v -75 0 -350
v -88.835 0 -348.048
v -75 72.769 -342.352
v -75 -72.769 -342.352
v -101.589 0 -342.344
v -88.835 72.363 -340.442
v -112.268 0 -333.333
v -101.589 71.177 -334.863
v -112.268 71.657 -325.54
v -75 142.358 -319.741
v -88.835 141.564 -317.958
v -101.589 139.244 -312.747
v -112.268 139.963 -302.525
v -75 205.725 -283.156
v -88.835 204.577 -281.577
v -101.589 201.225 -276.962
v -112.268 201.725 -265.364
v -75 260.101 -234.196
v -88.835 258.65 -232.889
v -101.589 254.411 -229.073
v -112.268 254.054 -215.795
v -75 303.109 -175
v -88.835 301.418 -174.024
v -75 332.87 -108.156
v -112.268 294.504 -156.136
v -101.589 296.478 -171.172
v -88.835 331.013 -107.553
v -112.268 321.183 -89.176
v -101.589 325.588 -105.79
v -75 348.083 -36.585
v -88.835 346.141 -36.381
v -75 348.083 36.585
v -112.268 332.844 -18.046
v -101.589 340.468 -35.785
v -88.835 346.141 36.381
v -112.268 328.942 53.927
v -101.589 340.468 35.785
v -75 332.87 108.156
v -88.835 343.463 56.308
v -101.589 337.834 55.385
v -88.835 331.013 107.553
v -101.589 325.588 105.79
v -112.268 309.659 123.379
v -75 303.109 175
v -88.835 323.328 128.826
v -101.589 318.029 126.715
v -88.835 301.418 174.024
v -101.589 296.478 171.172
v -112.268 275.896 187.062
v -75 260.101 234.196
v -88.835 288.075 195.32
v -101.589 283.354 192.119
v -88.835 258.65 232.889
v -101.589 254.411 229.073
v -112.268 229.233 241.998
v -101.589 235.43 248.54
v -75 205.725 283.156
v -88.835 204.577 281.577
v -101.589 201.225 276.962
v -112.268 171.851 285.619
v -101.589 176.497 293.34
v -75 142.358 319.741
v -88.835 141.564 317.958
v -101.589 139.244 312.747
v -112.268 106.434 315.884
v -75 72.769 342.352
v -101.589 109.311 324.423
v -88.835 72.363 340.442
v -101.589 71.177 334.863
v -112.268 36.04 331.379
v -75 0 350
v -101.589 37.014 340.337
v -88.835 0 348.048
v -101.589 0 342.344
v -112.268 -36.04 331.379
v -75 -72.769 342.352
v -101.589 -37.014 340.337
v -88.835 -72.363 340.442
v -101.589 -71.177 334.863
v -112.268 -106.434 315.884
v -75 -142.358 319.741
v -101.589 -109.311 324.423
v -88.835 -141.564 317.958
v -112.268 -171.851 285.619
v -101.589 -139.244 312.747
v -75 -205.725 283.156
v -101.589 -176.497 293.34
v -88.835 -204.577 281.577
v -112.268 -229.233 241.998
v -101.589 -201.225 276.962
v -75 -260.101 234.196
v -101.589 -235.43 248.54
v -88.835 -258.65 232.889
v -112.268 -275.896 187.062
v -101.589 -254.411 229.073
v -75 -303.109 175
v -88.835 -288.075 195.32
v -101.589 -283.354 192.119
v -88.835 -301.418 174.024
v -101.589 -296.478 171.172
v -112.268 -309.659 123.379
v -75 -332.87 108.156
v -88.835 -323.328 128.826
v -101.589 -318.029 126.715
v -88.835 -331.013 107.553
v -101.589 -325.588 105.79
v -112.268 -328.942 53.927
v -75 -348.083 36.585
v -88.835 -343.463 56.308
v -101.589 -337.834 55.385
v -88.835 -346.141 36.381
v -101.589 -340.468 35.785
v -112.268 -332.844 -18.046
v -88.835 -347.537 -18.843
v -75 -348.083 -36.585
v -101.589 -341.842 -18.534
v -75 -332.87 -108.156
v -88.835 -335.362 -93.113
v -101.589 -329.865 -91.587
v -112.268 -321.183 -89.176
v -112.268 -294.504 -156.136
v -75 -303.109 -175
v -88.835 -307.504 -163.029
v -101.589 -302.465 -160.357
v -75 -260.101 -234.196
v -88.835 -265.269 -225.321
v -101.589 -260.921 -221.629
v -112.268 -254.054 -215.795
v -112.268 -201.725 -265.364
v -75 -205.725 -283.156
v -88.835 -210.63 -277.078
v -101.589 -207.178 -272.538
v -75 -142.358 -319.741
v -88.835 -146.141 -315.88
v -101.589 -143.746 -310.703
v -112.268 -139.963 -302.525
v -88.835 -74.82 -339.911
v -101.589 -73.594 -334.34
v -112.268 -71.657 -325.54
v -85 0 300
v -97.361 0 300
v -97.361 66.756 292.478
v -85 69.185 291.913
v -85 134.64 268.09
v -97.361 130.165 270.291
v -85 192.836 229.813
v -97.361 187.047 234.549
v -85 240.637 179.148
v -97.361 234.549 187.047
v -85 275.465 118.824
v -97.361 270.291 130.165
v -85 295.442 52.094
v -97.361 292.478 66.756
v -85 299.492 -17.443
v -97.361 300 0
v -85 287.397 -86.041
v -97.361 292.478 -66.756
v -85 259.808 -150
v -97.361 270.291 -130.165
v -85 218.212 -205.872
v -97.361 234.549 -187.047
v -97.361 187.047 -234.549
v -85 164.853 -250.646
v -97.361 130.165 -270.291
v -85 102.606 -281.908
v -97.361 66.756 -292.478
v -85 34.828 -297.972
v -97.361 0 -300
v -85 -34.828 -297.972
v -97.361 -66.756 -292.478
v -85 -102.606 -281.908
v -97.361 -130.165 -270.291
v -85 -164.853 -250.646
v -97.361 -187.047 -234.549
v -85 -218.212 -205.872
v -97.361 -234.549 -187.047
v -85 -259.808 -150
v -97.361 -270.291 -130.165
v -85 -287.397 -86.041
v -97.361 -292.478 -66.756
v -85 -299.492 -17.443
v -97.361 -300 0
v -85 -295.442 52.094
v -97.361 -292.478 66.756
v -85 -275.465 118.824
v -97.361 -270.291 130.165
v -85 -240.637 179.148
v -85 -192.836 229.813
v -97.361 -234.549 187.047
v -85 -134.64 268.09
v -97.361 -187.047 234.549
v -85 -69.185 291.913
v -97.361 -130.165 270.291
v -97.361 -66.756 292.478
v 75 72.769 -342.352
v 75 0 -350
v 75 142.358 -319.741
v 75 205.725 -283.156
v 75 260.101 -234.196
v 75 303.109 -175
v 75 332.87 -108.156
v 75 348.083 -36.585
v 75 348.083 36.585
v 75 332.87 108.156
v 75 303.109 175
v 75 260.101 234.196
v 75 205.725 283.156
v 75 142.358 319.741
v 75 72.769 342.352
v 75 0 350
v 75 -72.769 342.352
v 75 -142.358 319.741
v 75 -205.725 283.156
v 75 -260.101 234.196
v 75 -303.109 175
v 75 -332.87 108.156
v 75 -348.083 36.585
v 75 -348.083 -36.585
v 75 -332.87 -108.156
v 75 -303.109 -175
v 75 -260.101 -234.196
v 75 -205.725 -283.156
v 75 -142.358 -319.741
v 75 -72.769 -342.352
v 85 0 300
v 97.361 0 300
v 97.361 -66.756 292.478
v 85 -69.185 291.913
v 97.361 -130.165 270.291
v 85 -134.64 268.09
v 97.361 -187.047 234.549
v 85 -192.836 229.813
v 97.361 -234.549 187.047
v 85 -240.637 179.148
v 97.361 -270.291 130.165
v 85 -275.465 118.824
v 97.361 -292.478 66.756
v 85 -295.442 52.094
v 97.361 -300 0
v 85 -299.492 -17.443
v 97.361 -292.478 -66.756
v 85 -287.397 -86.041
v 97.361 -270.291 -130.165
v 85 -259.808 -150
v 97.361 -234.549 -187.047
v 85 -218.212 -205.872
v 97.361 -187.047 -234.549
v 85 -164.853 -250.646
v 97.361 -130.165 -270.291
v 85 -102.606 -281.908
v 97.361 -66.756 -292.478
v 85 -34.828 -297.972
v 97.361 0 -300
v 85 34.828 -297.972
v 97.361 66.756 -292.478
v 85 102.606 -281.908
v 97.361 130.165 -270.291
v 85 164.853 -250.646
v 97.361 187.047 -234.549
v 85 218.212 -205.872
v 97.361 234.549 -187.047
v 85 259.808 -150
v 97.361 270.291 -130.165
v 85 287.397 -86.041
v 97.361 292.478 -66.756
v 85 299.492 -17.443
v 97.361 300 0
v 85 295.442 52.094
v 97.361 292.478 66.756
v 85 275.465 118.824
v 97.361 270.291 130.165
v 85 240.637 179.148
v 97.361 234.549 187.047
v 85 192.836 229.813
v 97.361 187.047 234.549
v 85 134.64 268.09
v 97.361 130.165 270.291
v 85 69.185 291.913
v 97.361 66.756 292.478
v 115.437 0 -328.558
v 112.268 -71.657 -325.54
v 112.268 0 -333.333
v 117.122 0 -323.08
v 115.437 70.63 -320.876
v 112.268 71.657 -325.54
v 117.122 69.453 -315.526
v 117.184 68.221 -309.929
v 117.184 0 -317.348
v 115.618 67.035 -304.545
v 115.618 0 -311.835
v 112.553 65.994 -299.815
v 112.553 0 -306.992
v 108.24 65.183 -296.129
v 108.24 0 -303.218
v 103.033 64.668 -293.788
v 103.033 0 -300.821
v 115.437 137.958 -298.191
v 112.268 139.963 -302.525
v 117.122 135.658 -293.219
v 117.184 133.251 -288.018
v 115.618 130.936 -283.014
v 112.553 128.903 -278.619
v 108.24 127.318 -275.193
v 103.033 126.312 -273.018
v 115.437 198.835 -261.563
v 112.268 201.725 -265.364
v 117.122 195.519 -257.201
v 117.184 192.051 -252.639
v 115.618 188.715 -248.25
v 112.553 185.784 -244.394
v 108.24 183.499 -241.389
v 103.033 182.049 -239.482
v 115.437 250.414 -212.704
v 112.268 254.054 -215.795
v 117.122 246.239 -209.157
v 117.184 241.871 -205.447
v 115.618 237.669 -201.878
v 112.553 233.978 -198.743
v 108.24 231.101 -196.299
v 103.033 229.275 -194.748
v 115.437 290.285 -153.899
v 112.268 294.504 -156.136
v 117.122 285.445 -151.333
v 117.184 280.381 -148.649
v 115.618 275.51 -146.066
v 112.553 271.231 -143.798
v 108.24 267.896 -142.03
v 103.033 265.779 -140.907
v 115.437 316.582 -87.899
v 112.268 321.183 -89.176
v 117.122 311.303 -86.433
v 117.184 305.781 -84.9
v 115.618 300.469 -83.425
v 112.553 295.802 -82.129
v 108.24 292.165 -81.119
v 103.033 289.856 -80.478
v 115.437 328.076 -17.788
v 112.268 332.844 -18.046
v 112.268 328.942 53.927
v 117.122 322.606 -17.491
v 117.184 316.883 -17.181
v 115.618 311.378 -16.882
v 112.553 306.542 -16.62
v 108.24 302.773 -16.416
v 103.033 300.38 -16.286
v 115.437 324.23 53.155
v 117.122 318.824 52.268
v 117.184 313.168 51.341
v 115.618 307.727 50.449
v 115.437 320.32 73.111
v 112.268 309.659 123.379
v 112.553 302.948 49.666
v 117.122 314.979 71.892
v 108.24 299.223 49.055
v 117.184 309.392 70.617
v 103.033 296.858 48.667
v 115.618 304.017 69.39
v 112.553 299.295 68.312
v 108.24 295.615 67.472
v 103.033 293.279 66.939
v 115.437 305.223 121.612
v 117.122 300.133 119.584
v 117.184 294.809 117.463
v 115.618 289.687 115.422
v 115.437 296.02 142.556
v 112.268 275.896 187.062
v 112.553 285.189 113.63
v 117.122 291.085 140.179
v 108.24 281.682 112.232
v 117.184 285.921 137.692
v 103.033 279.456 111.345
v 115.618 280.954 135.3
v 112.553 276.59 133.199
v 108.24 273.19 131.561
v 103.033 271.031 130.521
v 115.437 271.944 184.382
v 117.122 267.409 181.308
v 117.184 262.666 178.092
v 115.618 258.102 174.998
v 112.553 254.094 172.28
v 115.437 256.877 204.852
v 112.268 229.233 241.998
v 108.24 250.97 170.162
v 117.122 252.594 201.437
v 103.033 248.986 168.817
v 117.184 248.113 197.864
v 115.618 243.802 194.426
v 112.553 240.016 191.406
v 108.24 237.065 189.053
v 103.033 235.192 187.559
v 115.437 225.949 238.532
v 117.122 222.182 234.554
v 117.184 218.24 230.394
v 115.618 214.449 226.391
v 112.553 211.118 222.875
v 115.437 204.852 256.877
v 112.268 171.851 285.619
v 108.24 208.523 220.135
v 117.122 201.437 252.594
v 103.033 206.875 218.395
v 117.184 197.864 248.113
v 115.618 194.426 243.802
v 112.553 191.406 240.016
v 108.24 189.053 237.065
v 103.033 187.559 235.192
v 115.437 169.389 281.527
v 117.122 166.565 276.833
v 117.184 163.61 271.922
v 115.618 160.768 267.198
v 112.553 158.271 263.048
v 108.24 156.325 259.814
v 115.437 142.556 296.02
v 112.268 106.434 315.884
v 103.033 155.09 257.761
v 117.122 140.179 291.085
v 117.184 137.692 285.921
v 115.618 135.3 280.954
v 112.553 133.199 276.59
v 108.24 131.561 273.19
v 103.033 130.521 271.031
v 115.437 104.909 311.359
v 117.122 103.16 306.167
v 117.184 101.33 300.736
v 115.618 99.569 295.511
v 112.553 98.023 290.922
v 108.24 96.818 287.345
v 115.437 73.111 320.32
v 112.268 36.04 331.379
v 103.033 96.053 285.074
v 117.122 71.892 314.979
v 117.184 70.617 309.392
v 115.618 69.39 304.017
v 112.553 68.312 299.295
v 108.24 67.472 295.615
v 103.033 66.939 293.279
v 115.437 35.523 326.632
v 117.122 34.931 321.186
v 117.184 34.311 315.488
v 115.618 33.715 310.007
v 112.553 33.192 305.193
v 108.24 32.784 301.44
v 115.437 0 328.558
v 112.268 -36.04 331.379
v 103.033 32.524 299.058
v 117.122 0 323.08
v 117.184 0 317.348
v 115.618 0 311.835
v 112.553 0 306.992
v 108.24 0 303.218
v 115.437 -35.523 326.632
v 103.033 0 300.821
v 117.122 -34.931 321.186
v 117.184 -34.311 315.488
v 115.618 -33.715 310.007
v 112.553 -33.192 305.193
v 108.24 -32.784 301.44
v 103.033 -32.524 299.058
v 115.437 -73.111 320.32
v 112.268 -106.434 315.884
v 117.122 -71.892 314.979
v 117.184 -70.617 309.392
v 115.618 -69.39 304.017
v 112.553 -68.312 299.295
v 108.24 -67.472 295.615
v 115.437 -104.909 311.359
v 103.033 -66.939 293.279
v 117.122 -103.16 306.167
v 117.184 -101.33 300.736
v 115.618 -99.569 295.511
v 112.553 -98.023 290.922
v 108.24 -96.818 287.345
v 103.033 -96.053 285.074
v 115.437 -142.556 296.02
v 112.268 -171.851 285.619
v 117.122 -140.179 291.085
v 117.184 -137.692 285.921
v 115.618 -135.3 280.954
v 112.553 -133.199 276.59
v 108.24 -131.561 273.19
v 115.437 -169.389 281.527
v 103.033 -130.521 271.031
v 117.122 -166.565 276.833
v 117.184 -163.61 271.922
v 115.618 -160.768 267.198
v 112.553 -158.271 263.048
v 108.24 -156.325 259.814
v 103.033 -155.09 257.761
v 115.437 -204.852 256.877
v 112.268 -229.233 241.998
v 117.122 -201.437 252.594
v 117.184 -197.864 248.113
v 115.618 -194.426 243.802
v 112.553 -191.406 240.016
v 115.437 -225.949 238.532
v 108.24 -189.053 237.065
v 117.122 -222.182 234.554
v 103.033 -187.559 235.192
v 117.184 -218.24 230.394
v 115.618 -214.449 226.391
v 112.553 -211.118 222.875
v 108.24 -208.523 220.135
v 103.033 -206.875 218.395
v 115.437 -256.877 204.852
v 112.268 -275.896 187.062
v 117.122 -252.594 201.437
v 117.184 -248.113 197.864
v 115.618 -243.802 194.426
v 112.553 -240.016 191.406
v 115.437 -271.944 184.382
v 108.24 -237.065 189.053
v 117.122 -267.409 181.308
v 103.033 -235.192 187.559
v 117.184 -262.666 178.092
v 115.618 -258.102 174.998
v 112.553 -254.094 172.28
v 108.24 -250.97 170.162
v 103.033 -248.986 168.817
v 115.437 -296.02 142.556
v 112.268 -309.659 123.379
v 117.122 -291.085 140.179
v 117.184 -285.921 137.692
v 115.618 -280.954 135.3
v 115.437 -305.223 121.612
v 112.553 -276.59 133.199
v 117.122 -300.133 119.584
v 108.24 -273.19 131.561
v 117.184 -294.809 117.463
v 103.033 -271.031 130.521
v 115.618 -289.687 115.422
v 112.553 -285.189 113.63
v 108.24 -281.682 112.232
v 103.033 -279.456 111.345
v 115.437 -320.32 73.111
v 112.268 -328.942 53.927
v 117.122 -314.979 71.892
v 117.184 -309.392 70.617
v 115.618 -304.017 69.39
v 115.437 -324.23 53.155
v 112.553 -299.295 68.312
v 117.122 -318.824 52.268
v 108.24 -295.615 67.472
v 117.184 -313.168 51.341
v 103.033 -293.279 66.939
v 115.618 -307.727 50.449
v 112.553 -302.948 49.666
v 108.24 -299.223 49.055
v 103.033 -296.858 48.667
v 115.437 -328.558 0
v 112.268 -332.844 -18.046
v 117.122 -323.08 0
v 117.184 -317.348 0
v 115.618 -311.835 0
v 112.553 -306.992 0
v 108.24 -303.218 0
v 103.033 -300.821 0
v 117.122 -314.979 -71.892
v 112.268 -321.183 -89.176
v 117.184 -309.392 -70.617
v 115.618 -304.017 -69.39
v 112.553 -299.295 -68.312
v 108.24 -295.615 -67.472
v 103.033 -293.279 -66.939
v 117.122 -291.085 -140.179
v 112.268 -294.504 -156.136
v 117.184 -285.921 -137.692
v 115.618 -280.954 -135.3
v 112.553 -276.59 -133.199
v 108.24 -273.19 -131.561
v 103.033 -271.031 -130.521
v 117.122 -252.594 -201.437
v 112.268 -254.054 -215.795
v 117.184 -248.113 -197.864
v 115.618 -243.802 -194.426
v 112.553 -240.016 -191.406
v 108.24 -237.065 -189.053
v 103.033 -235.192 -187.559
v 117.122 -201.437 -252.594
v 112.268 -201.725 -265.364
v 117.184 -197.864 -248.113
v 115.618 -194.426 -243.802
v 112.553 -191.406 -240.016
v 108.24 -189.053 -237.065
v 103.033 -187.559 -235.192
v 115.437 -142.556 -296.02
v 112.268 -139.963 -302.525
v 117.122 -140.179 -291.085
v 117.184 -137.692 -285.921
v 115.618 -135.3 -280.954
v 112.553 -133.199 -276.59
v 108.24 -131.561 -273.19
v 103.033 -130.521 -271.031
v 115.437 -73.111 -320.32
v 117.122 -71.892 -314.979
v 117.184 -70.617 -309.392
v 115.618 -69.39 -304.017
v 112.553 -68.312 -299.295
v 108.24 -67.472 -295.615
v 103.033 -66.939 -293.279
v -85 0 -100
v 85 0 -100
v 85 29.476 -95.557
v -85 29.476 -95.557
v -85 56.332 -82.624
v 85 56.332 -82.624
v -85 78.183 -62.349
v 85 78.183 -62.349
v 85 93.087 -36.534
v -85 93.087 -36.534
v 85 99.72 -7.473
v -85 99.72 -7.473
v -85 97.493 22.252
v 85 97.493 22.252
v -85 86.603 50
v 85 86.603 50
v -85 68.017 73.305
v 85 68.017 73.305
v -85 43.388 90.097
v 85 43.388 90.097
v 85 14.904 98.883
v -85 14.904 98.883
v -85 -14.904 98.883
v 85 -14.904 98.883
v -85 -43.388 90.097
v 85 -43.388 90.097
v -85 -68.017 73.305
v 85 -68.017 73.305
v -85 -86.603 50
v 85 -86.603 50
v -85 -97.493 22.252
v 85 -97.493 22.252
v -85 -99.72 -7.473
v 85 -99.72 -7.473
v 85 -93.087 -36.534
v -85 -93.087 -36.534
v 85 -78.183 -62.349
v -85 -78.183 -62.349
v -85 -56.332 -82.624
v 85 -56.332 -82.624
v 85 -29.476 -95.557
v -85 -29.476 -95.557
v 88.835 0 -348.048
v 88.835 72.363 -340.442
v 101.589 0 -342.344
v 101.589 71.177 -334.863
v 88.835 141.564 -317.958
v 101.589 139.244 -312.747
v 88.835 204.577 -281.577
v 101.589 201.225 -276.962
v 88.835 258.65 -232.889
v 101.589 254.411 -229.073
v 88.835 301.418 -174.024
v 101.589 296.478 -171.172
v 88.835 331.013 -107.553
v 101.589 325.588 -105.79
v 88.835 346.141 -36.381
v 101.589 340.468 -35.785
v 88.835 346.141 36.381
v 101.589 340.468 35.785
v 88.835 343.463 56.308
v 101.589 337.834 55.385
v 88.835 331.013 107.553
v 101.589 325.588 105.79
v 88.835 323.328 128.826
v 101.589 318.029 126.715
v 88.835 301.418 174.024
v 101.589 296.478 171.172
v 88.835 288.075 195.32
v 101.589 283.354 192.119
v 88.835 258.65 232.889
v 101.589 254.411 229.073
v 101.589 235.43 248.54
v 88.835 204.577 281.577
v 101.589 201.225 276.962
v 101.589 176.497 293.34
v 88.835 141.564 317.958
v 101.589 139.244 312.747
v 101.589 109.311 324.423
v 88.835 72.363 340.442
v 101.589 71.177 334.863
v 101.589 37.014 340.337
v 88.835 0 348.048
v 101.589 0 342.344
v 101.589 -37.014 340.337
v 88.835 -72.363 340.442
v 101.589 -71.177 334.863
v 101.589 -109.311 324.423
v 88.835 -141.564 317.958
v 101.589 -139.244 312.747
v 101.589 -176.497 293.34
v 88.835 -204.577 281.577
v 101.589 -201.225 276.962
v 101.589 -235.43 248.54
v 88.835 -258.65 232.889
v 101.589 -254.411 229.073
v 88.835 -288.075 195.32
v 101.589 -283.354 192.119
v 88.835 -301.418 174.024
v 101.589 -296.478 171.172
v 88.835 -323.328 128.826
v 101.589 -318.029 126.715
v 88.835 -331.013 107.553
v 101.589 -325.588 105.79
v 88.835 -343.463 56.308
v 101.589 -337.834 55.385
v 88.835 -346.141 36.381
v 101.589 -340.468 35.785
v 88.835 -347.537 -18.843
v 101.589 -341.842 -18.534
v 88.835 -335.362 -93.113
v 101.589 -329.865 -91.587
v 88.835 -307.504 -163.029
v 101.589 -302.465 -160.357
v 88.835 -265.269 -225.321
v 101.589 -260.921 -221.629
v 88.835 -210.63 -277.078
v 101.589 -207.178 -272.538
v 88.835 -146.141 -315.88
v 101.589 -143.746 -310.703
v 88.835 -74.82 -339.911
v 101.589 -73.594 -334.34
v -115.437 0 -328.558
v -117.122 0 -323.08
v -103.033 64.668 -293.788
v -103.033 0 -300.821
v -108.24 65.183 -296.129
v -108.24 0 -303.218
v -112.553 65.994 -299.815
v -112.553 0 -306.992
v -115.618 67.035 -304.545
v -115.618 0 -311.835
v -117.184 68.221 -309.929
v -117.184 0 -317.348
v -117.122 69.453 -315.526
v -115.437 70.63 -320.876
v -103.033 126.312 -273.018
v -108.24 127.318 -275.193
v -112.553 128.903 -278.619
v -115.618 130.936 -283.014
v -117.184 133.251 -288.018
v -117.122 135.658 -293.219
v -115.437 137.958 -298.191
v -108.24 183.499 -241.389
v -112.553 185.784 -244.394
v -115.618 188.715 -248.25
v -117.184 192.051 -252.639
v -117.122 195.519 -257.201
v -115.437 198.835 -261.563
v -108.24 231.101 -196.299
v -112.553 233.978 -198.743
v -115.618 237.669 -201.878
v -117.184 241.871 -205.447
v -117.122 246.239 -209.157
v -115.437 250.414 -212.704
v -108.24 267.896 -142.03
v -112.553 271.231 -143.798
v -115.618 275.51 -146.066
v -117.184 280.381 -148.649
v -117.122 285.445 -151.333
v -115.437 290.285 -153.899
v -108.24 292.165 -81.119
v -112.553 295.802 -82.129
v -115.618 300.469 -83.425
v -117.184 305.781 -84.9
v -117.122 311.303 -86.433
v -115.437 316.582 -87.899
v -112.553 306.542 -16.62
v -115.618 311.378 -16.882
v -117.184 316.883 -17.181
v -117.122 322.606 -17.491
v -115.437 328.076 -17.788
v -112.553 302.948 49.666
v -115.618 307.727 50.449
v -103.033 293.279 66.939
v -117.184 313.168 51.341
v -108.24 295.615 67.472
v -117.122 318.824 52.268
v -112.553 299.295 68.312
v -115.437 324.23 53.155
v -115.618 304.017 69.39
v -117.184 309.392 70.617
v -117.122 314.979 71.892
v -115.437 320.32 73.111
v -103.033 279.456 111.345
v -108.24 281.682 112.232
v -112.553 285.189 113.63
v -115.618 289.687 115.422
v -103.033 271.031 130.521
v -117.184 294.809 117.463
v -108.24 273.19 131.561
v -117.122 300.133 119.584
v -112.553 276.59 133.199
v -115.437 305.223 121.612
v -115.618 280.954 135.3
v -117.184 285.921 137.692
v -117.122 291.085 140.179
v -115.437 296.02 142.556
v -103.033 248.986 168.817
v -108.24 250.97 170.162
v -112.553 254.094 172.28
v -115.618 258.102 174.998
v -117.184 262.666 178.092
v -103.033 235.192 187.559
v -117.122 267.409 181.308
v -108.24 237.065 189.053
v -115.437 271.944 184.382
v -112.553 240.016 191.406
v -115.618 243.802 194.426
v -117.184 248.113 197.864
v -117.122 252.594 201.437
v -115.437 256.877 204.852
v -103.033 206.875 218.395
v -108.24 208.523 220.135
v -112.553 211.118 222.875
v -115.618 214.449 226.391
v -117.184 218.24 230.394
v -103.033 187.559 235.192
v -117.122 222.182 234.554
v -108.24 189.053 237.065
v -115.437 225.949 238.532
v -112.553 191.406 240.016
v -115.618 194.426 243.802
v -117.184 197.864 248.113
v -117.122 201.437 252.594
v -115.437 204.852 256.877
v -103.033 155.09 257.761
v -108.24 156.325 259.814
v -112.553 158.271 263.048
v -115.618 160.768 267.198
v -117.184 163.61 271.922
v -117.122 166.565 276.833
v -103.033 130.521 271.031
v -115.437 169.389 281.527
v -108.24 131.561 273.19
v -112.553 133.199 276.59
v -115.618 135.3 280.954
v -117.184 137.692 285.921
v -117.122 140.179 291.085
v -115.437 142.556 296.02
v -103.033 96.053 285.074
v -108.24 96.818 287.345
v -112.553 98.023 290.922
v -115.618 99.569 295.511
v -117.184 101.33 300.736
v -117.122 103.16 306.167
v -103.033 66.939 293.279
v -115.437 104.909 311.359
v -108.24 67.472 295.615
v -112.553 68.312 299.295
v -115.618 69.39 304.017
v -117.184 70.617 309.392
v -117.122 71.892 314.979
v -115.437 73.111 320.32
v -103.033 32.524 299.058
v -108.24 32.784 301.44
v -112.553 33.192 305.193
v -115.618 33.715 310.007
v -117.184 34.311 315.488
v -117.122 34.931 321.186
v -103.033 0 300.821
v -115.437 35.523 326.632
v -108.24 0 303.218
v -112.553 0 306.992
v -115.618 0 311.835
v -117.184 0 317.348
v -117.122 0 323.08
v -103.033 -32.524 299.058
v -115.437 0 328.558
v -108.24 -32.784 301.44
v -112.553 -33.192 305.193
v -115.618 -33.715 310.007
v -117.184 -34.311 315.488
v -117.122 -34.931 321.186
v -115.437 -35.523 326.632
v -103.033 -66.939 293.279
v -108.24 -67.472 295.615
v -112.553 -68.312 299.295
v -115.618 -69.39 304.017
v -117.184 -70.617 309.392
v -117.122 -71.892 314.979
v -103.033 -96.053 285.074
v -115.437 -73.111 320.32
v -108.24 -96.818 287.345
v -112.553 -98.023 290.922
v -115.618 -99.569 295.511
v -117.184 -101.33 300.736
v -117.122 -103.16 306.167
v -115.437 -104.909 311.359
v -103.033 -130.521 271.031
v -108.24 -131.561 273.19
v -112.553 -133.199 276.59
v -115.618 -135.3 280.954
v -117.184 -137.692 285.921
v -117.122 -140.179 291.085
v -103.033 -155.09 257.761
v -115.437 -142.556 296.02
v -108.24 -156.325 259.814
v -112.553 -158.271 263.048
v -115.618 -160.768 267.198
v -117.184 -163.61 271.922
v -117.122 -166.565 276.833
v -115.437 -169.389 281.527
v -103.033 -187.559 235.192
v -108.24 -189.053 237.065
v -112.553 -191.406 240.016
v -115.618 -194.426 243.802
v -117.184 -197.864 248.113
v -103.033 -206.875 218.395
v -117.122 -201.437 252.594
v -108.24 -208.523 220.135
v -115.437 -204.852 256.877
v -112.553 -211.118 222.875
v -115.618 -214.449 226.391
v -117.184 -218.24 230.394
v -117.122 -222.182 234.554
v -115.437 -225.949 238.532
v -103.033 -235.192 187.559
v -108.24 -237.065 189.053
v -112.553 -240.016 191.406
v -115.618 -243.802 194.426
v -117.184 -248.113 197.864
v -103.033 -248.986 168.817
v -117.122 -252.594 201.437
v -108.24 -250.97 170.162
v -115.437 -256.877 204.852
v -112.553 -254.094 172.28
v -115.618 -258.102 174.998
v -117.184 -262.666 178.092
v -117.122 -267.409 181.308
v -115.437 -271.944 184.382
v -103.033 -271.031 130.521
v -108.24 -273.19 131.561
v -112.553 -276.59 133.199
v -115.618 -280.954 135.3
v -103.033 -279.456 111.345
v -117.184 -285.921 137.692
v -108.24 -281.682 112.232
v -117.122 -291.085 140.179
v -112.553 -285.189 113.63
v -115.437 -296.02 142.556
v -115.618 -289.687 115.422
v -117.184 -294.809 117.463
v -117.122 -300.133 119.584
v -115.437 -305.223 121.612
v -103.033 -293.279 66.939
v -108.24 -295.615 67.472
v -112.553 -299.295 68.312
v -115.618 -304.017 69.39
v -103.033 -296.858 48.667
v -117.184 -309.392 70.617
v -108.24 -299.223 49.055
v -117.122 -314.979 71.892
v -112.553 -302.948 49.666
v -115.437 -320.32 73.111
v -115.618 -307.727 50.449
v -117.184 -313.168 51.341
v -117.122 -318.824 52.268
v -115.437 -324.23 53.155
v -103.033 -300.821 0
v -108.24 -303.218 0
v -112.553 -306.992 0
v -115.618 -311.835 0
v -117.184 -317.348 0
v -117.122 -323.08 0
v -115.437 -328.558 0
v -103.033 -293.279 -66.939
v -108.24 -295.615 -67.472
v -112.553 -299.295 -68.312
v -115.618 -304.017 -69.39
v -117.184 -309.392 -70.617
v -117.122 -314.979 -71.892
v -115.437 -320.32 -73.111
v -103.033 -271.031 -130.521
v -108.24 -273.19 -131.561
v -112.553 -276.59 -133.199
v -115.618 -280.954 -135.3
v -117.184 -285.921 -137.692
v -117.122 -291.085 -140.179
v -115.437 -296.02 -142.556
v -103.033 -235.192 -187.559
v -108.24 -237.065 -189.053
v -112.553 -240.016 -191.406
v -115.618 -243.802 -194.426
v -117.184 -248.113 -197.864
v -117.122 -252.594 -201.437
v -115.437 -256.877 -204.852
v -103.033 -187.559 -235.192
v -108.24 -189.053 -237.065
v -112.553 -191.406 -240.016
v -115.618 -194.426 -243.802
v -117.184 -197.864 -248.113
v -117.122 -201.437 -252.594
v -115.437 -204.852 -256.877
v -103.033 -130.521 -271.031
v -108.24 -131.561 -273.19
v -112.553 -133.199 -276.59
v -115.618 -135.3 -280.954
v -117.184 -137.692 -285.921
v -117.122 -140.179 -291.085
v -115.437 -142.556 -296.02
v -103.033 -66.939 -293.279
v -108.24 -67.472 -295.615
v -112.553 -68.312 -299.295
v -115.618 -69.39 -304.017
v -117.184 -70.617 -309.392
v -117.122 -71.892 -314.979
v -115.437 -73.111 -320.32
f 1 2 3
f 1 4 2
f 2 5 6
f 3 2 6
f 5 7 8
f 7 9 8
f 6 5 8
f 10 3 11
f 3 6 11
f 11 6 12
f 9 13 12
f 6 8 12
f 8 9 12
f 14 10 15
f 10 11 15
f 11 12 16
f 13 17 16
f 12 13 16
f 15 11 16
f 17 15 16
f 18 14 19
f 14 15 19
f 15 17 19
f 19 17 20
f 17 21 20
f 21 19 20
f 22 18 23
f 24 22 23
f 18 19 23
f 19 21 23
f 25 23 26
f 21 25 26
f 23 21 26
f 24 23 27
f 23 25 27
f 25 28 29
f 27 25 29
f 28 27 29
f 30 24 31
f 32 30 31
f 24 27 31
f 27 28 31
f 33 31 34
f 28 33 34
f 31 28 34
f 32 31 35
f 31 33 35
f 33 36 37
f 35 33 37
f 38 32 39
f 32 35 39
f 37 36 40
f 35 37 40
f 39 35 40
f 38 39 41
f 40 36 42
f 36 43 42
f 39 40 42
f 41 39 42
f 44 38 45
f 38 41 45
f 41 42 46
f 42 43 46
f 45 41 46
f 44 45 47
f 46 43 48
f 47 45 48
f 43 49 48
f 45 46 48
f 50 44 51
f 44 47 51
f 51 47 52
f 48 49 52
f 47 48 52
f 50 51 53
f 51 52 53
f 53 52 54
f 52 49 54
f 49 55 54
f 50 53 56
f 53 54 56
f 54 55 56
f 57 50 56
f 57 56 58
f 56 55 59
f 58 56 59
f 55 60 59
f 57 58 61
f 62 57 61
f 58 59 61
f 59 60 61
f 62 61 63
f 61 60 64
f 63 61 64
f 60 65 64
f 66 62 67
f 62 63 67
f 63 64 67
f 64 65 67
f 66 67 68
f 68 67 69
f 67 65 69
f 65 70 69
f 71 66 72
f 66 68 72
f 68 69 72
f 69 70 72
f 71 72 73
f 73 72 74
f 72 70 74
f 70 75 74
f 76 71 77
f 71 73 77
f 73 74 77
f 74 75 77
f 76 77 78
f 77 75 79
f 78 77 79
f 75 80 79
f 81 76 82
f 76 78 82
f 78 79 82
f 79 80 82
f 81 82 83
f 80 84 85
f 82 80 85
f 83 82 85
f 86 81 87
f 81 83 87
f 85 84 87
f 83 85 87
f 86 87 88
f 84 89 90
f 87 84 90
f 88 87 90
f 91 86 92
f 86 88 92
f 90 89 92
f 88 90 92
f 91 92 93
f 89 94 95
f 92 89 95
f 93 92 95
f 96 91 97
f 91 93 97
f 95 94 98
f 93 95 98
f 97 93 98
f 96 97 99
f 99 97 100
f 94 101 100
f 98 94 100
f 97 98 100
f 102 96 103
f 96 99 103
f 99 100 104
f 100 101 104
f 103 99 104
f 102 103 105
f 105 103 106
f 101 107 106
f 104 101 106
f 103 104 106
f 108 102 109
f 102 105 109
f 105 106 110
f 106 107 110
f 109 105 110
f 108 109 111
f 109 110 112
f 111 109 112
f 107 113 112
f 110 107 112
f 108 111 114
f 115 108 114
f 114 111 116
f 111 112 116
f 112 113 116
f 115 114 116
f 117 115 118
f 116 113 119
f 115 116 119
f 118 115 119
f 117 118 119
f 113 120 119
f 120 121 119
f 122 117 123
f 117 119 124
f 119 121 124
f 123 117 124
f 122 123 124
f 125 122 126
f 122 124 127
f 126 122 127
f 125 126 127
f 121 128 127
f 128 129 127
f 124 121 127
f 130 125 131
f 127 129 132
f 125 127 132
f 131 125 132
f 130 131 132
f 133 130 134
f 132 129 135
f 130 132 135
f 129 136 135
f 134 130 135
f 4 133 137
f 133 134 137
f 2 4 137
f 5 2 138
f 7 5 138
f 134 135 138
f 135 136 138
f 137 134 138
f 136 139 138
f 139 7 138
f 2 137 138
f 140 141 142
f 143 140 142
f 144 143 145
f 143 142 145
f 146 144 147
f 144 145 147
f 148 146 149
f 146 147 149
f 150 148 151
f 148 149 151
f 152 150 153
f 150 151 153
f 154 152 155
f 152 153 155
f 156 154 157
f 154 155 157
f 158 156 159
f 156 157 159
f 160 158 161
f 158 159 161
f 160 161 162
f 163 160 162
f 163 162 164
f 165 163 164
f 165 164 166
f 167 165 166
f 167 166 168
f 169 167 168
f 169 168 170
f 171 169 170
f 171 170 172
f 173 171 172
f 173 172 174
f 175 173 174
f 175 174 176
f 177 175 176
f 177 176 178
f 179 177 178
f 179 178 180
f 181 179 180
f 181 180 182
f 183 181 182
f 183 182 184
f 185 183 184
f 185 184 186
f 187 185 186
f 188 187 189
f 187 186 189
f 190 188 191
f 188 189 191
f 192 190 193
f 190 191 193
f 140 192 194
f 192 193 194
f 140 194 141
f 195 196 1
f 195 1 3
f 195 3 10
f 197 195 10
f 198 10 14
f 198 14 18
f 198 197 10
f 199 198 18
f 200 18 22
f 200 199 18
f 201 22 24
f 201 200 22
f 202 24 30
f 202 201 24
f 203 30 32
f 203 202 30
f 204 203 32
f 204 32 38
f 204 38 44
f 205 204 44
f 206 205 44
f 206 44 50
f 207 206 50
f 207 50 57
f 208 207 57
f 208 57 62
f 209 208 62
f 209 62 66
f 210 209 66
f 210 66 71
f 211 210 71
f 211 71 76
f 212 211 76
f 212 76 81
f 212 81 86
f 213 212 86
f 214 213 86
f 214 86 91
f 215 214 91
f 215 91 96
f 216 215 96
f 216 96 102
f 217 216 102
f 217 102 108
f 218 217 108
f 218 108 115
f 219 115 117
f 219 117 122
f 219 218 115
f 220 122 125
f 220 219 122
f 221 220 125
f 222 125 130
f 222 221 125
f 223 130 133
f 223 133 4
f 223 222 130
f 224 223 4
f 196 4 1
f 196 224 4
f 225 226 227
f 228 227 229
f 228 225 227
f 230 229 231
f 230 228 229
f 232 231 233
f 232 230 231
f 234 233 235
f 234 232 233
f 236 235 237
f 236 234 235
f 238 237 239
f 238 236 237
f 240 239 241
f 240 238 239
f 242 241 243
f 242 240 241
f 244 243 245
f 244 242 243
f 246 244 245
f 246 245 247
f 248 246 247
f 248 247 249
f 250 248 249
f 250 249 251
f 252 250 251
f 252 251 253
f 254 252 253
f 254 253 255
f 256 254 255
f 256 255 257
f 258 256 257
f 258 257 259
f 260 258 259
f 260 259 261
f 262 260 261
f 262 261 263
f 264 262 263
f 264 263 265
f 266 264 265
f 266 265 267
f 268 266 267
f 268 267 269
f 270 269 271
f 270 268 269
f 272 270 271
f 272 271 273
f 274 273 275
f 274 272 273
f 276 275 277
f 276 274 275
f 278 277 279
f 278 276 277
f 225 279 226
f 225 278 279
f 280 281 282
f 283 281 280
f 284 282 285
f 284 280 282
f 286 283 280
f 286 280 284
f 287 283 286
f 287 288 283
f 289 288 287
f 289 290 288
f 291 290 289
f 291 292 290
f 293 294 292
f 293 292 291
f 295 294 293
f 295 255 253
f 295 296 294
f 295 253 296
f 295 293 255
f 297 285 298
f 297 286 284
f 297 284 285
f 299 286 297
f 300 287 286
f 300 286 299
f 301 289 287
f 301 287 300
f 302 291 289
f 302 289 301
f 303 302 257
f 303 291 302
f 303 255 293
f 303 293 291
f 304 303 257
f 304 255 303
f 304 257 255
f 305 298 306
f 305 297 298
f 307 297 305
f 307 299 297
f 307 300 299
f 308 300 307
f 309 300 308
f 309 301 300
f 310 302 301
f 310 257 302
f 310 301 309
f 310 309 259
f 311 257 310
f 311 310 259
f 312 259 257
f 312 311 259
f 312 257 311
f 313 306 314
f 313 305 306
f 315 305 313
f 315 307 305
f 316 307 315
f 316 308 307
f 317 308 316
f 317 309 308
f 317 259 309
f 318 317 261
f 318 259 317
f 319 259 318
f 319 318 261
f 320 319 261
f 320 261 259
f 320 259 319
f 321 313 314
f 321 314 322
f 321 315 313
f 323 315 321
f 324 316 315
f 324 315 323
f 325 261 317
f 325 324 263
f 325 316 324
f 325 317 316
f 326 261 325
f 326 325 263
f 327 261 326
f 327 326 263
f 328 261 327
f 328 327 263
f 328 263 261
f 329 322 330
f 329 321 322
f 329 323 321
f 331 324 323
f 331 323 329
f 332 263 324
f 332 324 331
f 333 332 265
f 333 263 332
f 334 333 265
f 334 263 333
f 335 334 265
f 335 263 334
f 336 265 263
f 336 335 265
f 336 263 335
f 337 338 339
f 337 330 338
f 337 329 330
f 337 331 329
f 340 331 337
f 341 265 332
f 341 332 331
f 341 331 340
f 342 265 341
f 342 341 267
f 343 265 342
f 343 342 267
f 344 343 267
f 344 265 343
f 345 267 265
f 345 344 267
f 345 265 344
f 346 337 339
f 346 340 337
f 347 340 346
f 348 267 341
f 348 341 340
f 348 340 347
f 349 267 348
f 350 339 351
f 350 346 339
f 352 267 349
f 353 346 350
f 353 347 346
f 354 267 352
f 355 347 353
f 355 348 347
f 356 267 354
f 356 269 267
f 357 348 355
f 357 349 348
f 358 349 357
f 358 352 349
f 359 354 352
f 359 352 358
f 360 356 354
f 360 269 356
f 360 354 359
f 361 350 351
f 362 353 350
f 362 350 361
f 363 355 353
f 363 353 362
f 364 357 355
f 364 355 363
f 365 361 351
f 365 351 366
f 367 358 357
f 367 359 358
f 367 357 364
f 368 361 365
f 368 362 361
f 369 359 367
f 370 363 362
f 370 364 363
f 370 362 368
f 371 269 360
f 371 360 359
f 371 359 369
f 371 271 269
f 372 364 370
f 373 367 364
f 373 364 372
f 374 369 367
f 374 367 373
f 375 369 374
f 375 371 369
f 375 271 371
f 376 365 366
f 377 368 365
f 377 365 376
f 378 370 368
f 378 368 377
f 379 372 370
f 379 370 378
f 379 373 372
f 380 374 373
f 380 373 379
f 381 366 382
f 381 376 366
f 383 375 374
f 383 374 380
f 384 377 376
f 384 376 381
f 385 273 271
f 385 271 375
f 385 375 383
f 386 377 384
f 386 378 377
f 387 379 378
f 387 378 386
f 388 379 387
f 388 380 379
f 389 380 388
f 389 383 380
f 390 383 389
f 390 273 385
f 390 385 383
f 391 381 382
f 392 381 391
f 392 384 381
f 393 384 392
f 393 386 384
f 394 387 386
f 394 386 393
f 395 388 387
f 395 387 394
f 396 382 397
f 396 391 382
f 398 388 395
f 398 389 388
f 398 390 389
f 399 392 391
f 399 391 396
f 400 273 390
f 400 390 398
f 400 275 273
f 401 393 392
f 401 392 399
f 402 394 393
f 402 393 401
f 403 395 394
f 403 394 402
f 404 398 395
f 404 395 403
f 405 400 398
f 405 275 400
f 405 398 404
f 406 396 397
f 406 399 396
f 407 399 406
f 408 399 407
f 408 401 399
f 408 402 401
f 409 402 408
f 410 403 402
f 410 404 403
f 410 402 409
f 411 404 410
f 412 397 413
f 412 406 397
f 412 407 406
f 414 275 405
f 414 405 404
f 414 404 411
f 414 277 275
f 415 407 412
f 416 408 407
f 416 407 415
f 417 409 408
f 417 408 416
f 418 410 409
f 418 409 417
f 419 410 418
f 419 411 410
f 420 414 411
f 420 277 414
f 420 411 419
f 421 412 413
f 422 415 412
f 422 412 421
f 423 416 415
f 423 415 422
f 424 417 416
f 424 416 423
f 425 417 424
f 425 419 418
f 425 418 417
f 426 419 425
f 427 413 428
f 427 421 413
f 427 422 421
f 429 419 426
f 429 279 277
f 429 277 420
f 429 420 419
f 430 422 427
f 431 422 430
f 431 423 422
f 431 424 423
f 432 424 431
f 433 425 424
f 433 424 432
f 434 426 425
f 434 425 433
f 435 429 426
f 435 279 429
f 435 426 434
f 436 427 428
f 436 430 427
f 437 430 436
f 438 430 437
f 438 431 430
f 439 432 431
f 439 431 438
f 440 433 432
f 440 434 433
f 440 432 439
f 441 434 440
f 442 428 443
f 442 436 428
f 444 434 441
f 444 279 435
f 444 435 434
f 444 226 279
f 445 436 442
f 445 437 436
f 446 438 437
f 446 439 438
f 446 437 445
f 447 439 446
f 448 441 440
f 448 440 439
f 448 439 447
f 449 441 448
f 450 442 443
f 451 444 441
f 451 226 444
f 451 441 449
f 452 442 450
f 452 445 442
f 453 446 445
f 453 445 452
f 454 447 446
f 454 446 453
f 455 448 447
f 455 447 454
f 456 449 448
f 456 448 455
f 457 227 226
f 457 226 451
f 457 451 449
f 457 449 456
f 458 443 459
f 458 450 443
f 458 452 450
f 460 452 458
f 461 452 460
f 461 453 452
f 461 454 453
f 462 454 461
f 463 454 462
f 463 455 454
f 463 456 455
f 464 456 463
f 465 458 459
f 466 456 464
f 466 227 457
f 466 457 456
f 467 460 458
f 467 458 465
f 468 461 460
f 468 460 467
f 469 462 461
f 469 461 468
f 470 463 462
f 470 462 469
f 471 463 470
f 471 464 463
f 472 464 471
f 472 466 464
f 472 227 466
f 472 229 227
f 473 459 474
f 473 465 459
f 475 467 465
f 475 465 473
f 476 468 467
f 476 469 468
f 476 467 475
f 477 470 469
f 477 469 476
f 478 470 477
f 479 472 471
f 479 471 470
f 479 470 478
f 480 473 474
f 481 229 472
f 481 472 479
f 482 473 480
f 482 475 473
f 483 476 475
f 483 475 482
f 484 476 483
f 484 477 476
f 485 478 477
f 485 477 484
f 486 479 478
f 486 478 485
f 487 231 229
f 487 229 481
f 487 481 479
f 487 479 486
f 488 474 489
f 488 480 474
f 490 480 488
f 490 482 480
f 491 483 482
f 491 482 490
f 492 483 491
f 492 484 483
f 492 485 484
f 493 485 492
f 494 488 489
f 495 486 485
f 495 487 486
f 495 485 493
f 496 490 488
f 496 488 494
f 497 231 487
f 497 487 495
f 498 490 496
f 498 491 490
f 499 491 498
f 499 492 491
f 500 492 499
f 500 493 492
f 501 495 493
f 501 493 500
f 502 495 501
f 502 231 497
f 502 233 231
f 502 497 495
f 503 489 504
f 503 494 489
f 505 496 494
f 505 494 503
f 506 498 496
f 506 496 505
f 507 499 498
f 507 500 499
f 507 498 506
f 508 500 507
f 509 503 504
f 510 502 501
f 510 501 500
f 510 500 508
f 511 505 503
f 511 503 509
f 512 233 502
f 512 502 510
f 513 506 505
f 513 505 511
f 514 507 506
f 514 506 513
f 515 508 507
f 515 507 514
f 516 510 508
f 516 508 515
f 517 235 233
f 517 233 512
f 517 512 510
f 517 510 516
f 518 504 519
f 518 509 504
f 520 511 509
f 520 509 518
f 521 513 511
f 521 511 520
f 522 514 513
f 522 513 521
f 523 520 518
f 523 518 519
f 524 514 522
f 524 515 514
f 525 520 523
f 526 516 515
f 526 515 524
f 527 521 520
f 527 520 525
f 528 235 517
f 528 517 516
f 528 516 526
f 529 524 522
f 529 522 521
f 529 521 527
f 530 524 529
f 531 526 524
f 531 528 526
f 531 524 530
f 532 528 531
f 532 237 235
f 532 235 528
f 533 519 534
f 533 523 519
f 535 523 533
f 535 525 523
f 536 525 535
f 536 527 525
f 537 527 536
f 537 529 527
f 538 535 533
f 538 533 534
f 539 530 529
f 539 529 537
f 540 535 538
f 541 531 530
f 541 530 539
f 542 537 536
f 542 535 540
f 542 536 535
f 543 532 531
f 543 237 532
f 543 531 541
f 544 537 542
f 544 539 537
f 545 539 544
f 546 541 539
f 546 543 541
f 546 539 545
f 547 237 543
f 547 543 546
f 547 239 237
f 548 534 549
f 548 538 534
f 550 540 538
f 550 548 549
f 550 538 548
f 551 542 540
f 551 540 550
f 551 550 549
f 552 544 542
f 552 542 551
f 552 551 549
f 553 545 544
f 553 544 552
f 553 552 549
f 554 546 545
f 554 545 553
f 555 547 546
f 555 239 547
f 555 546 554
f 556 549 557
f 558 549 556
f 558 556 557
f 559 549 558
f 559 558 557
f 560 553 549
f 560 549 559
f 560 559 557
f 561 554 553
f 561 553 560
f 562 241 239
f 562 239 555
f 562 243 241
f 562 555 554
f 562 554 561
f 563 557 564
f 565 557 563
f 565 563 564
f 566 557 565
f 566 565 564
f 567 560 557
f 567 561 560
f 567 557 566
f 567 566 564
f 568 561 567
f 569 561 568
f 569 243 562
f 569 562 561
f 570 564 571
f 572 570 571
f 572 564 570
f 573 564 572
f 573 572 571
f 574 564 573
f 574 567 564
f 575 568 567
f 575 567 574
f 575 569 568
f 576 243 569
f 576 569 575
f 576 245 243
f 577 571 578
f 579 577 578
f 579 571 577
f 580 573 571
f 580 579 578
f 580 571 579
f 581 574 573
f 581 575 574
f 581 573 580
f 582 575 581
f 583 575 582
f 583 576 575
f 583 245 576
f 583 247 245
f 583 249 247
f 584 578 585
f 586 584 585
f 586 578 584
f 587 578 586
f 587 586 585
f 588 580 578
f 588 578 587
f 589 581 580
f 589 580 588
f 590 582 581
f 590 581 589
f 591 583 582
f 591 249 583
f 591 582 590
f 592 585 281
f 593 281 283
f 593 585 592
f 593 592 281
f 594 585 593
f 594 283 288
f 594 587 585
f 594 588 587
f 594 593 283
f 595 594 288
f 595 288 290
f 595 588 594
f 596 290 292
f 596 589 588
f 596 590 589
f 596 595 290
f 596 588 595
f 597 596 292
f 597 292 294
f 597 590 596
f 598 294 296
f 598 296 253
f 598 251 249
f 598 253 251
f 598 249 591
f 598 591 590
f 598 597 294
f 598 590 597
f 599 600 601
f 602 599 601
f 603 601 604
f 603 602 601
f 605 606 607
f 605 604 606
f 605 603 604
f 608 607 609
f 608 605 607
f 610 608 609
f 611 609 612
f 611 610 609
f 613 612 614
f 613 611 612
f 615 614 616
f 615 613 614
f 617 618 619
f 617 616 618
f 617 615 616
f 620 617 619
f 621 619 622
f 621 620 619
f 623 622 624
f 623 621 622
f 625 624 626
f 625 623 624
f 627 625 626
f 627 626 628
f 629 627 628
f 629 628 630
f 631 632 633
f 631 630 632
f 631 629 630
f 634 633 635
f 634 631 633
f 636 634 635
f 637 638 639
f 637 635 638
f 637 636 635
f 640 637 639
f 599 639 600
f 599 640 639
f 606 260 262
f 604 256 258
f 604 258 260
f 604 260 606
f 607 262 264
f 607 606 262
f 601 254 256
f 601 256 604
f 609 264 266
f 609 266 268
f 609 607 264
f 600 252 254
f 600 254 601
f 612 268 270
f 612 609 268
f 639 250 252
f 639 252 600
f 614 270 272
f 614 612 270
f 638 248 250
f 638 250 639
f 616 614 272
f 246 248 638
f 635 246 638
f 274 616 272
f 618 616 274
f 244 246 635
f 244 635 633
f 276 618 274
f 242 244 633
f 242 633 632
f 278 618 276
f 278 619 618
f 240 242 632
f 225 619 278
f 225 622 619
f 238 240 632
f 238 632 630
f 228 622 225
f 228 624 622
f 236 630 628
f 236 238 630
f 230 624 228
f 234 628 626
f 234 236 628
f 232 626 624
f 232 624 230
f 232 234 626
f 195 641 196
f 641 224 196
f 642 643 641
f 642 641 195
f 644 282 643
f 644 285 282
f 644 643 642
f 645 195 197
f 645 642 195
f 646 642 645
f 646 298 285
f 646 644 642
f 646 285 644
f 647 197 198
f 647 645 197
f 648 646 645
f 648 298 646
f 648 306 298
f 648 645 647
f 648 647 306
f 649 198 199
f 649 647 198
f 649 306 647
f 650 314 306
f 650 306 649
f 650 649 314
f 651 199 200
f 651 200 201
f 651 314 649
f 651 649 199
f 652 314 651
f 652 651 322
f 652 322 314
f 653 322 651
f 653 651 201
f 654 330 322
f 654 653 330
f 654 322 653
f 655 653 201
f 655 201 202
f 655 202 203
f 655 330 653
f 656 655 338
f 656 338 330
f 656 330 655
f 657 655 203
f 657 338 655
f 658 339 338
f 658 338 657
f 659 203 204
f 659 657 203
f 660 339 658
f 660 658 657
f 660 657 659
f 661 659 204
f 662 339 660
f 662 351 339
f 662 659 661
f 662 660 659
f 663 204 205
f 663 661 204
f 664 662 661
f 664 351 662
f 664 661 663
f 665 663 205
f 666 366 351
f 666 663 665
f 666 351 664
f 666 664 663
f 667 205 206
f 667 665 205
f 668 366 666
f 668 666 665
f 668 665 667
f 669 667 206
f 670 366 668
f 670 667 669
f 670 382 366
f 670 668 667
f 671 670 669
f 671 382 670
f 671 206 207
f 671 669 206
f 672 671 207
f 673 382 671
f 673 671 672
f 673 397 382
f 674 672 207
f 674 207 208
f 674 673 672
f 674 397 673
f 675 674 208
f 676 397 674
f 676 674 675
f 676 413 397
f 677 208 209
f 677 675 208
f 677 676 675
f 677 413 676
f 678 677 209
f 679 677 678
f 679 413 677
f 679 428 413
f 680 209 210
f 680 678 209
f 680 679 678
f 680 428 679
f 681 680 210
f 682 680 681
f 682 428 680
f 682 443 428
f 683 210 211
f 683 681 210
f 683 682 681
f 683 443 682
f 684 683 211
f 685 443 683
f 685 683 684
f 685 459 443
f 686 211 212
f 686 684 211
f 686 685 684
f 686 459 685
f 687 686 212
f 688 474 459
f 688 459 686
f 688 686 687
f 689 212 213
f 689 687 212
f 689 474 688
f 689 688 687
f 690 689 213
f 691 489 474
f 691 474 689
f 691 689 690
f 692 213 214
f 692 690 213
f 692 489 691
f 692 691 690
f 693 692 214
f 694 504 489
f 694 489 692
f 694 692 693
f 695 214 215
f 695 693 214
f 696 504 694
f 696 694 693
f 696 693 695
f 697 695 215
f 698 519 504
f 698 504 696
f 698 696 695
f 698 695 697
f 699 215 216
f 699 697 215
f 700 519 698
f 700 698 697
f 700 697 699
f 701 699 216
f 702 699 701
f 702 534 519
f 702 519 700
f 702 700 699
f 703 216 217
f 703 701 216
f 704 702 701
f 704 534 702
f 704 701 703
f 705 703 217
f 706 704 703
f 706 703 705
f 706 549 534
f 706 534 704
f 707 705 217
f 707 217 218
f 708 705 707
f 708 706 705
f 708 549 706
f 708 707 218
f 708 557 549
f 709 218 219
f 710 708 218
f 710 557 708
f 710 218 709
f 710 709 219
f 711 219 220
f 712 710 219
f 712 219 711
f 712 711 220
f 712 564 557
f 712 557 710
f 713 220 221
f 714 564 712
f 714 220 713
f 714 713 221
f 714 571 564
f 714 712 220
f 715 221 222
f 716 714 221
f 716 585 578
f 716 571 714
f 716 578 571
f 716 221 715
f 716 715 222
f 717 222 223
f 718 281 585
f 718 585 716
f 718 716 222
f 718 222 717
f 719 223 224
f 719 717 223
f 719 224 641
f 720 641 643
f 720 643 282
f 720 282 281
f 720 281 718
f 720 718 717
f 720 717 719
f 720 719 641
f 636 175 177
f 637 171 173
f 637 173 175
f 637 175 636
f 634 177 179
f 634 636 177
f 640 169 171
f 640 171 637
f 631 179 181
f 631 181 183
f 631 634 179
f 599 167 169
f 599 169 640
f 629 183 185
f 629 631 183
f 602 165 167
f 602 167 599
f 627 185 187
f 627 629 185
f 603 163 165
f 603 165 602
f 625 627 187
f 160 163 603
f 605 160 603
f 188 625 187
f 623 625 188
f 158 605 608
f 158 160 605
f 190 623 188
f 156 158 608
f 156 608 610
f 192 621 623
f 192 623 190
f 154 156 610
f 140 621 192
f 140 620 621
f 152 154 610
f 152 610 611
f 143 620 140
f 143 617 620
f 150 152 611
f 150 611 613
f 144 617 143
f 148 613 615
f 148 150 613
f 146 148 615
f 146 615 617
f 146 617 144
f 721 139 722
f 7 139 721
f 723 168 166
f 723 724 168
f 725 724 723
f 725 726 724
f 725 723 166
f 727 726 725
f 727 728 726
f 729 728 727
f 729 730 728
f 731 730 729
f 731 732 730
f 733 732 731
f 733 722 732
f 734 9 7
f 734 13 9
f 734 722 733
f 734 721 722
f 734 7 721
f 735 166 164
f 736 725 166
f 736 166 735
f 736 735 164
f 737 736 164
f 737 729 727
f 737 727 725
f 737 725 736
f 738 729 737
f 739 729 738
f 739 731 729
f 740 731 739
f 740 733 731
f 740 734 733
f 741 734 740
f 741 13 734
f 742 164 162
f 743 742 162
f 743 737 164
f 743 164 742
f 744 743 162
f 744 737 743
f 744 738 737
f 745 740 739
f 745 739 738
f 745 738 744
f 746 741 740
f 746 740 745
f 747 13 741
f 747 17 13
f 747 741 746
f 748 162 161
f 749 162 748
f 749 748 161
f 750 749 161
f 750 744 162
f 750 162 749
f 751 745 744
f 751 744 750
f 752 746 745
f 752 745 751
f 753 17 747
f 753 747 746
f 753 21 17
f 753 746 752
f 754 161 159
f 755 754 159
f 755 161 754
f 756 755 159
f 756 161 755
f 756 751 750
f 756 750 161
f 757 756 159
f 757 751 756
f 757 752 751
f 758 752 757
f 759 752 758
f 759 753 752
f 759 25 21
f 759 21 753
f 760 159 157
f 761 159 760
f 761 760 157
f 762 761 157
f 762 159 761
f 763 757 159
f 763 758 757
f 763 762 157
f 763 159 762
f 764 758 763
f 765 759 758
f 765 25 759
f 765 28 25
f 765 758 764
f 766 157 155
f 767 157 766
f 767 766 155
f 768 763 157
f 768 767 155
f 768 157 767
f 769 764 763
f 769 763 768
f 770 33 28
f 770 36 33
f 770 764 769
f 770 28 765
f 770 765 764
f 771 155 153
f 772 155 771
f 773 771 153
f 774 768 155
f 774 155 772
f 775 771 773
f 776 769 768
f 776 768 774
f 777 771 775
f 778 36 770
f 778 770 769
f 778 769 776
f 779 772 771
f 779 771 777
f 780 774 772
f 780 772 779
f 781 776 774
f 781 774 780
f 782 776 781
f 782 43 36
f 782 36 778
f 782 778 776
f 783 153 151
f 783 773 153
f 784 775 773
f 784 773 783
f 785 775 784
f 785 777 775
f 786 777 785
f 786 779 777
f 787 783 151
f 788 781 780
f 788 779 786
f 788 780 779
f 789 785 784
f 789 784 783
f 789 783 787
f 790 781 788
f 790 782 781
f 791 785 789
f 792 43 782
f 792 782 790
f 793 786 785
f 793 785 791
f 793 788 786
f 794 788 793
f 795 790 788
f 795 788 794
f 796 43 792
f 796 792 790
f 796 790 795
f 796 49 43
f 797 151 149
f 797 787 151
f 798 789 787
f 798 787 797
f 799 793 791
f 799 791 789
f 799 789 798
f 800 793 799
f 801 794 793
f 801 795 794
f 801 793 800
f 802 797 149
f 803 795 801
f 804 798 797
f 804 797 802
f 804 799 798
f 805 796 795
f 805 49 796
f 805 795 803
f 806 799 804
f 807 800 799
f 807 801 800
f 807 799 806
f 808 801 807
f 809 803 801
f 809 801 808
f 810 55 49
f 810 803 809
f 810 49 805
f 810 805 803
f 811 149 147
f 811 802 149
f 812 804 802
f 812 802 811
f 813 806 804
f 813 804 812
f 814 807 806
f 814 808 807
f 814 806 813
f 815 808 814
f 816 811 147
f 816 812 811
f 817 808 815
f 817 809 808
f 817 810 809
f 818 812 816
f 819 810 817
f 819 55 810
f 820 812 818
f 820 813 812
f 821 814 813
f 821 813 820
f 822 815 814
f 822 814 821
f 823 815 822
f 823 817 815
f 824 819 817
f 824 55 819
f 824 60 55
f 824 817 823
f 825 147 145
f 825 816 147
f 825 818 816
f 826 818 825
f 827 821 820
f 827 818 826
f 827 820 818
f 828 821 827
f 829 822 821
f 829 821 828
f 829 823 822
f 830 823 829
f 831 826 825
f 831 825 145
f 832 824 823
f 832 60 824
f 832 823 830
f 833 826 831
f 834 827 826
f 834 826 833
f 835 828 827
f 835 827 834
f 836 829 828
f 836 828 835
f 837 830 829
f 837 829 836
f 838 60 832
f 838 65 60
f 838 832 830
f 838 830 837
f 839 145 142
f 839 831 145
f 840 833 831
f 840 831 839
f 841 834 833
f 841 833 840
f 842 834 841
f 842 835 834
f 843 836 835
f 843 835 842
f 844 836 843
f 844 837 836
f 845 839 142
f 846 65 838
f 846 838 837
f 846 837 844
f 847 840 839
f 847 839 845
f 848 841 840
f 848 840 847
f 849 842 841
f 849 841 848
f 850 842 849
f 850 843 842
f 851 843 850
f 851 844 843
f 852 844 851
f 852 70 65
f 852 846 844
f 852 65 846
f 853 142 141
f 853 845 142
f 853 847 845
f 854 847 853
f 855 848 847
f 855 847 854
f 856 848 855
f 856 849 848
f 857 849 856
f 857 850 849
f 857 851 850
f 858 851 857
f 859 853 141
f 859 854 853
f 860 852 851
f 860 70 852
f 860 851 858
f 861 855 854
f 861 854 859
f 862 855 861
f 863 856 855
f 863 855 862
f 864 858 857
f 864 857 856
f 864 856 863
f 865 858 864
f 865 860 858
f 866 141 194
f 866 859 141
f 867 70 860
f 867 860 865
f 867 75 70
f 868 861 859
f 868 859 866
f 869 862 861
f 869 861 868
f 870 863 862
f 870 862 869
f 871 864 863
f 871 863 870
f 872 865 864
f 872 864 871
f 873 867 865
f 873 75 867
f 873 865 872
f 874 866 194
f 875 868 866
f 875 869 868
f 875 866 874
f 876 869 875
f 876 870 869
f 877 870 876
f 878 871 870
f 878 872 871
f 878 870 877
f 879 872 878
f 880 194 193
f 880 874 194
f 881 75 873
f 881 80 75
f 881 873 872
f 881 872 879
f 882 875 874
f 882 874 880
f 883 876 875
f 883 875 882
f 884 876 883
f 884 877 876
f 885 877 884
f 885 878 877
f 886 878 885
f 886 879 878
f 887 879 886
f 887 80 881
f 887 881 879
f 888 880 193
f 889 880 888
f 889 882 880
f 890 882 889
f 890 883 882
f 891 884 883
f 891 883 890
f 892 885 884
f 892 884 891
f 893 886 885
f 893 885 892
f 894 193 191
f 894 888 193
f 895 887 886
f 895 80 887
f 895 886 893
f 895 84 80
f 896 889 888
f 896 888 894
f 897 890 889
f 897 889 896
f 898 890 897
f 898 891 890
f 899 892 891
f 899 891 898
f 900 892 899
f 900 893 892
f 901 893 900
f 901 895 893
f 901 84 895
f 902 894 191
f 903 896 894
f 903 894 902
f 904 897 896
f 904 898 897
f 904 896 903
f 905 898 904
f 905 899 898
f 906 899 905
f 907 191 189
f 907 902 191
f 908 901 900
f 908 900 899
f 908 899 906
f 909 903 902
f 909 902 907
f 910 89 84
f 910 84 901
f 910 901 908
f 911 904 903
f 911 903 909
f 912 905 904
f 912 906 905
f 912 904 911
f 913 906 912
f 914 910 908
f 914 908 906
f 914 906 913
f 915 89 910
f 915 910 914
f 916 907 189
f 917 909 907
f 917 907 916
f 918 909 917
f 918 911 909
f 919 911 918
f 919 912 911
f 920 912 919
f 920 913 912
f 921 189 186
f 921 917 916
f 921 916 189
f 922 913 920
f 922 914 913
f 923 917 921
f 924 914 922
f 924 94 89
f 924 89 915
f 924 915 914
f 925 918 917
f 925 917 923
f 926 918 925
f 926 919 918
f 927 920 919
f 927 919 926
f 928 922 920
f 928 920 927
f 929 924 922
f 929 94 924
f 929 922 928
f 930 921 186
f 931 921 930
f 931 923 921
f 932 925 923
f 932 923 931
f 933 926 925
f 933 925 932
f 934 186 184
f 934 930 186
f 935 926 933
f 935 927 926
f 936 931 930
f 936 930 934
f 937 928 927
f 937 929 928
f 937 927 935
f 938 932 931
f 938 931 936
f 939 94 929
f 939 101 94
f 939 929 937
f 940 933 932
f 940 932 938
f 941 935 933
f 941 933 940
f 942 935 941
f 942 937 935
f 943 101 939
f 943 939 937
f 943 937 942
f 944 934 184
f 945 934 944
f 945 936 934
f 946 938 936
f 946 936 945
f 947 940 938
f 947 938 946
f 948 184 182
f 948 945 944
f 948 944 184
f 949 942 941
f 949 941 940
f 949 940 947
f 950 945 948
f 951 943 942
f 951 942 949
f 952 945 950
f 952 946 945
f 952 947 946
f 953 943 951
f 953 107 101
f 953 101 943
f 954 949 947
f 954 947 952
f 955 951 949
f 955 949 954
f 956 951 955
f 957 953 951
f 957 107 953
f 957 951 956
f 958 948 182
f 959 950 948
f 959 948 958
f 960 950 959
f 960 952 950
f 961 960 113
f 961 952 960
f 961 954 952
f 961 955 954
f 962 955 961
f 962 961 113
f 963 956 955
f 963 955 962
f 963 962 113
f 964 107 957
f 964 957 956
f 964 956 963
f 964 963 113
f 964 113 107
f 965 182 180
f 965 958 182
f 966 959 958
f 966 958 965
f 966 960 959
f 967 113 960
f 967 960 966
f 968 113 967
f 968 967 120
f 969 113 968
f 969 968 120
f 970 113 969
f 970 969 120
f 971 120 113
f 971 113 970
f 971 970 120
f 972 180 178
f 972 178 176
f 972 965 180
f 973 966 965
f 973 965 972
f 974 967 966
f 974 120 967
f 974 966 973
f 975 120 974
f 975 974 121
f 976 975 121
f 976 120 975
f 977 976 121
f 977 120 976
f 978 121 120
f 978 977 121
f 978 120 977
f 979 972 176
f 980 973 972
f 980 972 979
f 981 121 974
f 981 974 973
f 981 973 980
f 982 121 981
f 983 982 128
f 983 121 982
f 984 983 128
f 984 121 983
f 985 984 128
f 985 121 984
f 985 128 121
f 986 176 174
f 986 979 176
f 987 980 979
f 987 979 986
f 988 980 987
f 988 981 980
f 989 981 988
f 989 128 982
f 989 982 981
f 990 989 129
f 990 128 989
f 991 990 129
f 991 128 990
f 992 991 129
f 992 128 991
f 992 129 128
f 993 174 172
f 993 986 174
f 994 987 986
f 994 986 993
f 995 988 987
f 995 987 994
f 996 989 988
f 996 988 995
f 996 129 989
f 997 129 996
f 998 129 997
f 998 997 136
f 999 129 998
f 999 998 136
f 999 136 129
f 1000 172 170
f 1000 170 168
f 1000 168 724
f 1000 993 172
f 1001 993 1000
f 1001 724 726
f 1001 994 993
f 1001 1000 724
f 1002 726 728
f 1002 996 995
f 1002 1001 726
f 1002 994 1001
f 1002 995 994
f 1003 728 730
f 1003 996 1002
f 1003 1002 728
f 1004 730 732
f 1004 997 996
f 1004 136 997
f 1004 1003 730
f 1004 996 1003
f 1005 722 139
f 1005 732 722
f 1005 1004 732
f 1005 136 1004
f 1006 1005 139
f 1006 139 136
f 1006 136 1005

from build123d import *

# Parameters (mm, degrees)
SKETCH1_R           = 350
SKETCH1_R_2         = 100
BOSS_EXTRUDE1_DEPTH = 125
FILLET1_R           = 50
FILLET2_R           = 50
SKETCH2_R           = 300
CUT_EXTRUDE1_DEPTH  = 40
CUT_EXTRUDE2_START  = -40
SKETCH4_R           = 300
CUT_EXTRUDE2_DEPTH  = 40
FILLET3_R           = 20
FILLET4_R           = 20


with BuildPart() as part:
    # Sketch1 → Boss-Extrude1 (new, symmetric)
    with BuildSketch(Plane(origin=(0, 0, 0), x_dir=(0, 0, -1), z_dir=(1, 0, 0))):
        Circle(SKETCH1_R)
        Circle(SKETCH1_R_2, mode=Mode.SUBTRACT)
    extrude(amount=BOSS_EXTRUDE1_DEPTH, both=True)

    # Fillet1
    fillet1_edges = [part.edges().sort_by_distance(p)[0] for p in [
        (-125, 0, 350),
    ]]
    fillet(fillet1_edges, radius=FILLET1_R)

    # Fillet2
    fillet2_edges = [part.edges().sort_by_distance(p)[0] for p in [
        (125, 0, 350),
    ]]
    fillet(fillet2_edges, radius=FILLET2_R)

    # Sketch2 → Cut-Extrude1 (cut)
    with BuildSketch(Plane.ZY.offset(125)):
        Circle(SKETCH2_R)
    extrude(amount=-CUT_EXTRUDE1_DEPTH, mode=Mode.SUBTRACT)

    # Sketch4 → Cut-Extrude2 (cut)
    with BuildSketch(Plane(origin=(125, 0, 0), x_dir=(0, 0, -1), z_dir=(1, 0, 0)).offset(CUT_EXTRUDE2_START)):
        with Locations(Location((0, 0, 0), (0, 0, 180))):
            Circle(SKETCH4_R)
    extrude(amount=CUT_EXTRUDE2_DEPTH, mode=Mode.SUBTRACT)

    # Fillet3
    # the kernel refuses this fillet: 20 mm, written as the material it takes off along each edge
    with BuildSketch(Plane(origin=(125, 0, 0), x_dir=(0, 0, -1), z_dir=(0, -1, 0))) as fillet3_piece_1:
        with BuildLine():
            CenterArc((320, -27.639320225), FILLET3_R, 48.189685104, 131.810314896)
            Line((300, -27.639320225), (300, 0))
            ThreePointArc((300, 0), (317.841104489, -3.291382052), (333.333333333, -12.732200375))
        make_face()
    fillet3_piece_1_solid = revolve(axis=Axis((125, 0, 0), (1, 0, 0)), revolution_arc=180, mode=Mode.PRIVATE)
    with BuildSketch(Plane(origin=(125, 0, 0), x_dir=(0, 0, 1), z_dir=(0, 1, 0))) as fillet3_piece_2:
        with BuildLine():
            CenterArc((320, -27.639320225), FILLET3_R, 48.189685104, 131.810314896)
            Line((300, -27.639320225), (300, 0))
            ThreePointArc((300, 0), (317.841104489, -3.291382052), (333.333333333, -12.732200375))
        make_face()
    fillet3_piece_2_solid = revolve(axis=Axis((125, 0, 0), (1, 0, 0)), revolution_arc=180, mode=Mode.PRIVATE)
    add([fillet3_piece_1_solid, fillet3_piece_2_solid], mode=Mode.SUBTRACT)

    # Fillet4
    # the kernel refuses this fillet: 20 mm, written as the material it takes off along each edge
    with BuildSketch(Plane(origin=(-125, 0, 0), x_dir=(0, 0, -1), z_dir=(0, -1, 0))) as fillet4_piece_1:
        with BuildLine():
            CenterArc((320, 27.639320225), FILLET4_R, 180, 131.810314896)
            Line((300, 27.639320225), (300, 0))
            ThreePointArc((300, 0), (317.841104489, 3.291382052), (333.333333333, 12.732200375))
        make_face()
    fillet4_piece_1_solid = revolve(axis=Axis((-125, 0, 0), (1, 0, 0)), revolution_arc=180, mode=Mode.PRIVATE)
    with BuildSketch(Plane(origin=(-125, 0, 0), x_dir=(0, 0, 1), z_dir=(0, 1, 0))) as fillet4_piece_2:
        with BuildLine():
            CenterArc((320, 27.639320225), FILLET4_R, 180, 131.810314896)
            Line((300, 27.639320225), (300, 0))
            ThreePointArc((300, 0), (317.841104489, 3.291382052), (333.333333333, 12.732200375))
        make_face()
    fillet4_piece_2_solid = revolve(axis=Axis((-125, 0, 0), (1, 0, 0)), revolution_arc=180, mode=Mode.PRIVATE)
    add([fillet4_piece_1_solid, fillet4_piece_2_solid], mode=Mode.SUBTRACT)


solid = part.part
